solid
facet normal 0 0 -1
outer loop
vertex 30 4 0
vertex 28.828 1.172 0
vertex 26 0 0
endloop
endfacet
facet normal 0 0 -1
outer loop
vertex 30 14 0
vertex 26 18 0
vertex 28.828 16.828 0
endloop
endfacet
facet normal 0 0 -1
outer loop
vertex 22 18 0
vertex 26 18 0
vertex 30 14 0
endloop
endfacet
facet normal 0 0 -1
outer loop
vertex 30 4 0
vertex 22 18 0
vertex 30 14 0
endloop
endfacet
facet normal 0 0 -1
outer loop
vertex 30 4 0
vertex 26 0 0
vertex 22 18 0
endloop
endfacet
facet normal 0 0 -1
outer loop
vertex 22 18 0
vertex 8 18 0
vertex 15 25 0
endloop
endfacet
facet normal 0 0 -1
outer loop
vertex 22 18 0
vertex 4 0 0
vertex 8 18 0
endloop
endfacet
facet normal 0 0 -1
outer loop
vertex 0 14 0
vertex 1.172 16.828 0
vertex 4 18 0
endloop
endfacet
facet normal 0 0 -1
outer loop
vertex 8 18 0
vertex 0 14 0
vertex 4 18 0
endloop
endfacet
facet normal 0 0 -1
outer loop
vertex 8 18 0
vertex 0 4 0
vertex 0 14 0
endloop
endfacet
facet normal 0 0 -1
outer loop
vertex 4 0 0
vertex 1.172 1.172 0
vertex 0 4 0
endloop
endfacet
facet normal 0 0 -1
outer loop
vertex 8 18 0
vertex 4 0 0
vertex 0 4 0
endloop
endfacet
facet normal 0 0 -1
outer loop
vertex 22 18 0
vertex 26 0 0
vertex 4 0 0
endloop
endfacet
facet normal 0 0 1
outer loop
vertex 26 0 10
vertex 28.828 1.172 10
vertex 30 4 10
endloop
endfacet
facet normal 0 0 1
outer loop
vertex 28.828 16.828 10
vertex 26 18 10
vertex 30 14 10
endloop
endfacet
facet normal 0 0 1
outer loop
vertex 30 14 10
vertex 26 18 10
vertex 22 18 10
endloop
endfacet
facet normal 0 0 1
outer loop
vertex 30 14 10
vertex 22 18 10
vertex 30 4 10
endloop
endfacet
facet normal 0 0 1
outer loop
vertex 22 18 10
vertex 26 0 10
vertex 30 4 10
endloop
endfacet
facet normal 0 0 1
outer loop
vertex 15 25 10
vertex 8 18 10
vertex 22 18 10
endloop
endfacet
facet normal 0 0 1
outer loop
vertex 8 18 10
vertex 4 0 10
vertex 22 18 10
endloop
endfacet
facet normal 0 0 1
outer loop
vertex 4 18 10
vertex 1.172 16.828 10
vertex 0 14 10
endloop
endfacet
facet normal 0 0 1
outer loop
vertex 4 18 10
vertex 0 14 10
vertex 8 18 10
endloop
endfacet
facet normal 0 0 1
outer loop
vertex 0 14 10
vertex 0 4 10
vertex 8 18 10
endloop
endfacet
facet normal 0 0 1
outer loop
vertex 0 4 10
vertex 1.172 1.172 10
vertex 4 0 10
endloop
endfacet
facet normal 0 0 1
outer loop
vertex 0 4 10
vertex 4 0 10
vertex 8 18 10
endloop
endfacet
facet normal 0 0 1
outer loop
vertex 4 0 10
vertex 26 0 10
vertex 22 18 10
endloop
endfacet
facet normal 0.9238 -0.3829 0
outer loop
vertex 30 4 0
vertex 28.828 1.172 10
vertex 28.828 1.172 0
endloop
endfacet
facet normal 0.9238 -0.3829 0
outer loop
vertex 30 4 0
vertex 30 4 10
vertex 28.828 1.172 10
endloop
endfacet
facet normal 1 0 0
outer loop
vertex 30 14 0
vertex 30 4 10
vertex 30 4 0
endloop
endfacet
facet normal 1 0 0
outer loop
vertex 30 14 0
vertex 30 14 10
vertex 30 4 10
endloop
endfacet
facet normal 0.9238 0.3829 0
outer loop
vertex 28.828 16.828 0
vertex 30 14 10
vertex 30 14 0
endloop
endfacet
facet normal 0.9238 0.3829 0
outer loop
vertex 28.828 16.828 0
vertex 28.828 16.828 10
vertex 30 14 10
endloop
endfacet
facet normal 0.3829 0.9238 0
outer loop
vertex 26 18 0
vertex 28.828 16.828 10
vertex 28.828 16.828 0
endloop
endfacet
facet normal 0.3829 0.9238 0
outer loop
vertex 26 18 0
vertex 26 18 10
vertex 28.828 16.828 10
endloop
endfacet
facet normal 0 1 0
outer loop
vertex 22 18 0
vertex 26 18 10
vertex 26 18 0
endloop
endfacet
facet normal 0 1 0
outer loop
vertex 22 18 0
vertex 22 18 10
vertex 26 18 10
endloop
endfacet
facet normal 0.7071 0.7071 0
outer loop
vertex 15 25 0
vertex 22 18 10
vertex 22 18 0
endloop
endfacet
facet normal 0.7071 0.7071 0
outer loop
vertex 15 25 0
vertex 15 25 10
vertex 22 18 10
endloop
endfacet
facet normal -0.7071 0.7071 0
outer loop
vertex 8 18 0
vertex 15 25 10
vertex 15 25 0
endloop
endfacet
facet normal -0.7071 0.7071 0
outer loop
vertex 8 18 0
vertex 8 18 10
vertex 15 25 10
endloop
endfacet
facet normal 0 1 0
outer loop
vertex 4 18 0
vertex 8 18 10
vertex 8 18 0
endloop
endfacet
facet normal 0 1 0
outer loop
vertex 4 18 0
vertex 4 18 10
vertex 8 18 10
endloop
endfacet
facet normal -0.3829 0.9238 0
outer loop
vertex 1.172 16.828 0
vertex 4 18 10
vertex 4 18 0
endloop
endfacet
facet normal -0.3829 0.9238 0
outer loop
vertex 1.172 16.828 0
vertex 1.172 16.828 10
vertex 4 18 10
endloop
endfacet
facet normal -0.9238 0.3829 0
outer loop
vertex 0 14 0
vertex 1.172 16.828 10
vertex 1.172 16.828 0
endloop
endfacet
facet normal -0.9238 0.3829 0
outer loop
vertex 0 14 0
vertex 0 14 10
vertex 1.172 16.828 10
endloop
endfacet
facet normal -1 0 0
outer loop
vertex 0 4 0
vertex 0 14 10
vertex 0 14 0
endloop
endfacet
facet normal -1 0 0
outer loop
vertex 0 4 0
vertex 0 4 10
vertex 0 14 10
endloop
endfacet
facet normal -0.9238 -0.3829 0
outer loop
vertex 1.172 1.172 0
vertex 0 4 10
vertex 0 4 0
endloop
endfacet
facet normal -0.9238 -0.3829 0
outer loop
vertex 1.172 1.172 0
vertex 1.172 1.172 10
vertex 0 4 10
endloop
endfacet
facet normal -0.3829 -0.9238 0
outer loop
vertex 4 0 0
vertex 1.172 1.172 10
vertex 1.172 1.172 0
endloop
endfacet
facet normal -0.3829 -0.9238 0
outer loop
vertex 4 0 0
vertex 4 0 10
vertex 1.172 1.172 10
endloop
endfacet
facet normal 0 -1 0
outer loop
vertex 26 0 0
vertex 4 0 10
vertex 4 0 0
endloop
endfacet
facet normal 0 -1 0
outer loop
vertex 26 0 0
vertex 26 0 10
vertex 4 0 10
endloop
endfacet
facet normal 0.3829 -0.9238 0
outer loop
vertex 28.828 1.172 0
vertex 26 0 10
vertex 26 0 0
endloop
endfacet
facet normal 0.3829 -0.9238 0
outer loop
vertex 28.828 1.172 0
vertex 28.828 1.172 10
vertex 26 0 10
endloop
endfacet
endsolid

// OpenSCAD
$fn = 32;

// ----------------------------------------------------------------------
// Ratchet pawl: 30 x 18 mm body, beak 7 mm сверху
// ----------------------------------------------------------------------

// --- parameters (mm) ---
profile_height = 10;      // extrusion height
profile_points = 15;      // points of the closed outline

profile = [[0, 4], [1.172, 1.172], [4, 0], [26, 0], [28.828, 1.172], [30, 4], [30, 14], [28.828, 16.828], [26, 18], [22, 18], [15, 25], [8, 18], [4, 18], [1.172, 16.828], [0, 14]];  // single closed polygon, 15 points, counter clockwise

// --- the one profile operation ---
linear_extrude(height = profile_height) polygon(points = profile);
